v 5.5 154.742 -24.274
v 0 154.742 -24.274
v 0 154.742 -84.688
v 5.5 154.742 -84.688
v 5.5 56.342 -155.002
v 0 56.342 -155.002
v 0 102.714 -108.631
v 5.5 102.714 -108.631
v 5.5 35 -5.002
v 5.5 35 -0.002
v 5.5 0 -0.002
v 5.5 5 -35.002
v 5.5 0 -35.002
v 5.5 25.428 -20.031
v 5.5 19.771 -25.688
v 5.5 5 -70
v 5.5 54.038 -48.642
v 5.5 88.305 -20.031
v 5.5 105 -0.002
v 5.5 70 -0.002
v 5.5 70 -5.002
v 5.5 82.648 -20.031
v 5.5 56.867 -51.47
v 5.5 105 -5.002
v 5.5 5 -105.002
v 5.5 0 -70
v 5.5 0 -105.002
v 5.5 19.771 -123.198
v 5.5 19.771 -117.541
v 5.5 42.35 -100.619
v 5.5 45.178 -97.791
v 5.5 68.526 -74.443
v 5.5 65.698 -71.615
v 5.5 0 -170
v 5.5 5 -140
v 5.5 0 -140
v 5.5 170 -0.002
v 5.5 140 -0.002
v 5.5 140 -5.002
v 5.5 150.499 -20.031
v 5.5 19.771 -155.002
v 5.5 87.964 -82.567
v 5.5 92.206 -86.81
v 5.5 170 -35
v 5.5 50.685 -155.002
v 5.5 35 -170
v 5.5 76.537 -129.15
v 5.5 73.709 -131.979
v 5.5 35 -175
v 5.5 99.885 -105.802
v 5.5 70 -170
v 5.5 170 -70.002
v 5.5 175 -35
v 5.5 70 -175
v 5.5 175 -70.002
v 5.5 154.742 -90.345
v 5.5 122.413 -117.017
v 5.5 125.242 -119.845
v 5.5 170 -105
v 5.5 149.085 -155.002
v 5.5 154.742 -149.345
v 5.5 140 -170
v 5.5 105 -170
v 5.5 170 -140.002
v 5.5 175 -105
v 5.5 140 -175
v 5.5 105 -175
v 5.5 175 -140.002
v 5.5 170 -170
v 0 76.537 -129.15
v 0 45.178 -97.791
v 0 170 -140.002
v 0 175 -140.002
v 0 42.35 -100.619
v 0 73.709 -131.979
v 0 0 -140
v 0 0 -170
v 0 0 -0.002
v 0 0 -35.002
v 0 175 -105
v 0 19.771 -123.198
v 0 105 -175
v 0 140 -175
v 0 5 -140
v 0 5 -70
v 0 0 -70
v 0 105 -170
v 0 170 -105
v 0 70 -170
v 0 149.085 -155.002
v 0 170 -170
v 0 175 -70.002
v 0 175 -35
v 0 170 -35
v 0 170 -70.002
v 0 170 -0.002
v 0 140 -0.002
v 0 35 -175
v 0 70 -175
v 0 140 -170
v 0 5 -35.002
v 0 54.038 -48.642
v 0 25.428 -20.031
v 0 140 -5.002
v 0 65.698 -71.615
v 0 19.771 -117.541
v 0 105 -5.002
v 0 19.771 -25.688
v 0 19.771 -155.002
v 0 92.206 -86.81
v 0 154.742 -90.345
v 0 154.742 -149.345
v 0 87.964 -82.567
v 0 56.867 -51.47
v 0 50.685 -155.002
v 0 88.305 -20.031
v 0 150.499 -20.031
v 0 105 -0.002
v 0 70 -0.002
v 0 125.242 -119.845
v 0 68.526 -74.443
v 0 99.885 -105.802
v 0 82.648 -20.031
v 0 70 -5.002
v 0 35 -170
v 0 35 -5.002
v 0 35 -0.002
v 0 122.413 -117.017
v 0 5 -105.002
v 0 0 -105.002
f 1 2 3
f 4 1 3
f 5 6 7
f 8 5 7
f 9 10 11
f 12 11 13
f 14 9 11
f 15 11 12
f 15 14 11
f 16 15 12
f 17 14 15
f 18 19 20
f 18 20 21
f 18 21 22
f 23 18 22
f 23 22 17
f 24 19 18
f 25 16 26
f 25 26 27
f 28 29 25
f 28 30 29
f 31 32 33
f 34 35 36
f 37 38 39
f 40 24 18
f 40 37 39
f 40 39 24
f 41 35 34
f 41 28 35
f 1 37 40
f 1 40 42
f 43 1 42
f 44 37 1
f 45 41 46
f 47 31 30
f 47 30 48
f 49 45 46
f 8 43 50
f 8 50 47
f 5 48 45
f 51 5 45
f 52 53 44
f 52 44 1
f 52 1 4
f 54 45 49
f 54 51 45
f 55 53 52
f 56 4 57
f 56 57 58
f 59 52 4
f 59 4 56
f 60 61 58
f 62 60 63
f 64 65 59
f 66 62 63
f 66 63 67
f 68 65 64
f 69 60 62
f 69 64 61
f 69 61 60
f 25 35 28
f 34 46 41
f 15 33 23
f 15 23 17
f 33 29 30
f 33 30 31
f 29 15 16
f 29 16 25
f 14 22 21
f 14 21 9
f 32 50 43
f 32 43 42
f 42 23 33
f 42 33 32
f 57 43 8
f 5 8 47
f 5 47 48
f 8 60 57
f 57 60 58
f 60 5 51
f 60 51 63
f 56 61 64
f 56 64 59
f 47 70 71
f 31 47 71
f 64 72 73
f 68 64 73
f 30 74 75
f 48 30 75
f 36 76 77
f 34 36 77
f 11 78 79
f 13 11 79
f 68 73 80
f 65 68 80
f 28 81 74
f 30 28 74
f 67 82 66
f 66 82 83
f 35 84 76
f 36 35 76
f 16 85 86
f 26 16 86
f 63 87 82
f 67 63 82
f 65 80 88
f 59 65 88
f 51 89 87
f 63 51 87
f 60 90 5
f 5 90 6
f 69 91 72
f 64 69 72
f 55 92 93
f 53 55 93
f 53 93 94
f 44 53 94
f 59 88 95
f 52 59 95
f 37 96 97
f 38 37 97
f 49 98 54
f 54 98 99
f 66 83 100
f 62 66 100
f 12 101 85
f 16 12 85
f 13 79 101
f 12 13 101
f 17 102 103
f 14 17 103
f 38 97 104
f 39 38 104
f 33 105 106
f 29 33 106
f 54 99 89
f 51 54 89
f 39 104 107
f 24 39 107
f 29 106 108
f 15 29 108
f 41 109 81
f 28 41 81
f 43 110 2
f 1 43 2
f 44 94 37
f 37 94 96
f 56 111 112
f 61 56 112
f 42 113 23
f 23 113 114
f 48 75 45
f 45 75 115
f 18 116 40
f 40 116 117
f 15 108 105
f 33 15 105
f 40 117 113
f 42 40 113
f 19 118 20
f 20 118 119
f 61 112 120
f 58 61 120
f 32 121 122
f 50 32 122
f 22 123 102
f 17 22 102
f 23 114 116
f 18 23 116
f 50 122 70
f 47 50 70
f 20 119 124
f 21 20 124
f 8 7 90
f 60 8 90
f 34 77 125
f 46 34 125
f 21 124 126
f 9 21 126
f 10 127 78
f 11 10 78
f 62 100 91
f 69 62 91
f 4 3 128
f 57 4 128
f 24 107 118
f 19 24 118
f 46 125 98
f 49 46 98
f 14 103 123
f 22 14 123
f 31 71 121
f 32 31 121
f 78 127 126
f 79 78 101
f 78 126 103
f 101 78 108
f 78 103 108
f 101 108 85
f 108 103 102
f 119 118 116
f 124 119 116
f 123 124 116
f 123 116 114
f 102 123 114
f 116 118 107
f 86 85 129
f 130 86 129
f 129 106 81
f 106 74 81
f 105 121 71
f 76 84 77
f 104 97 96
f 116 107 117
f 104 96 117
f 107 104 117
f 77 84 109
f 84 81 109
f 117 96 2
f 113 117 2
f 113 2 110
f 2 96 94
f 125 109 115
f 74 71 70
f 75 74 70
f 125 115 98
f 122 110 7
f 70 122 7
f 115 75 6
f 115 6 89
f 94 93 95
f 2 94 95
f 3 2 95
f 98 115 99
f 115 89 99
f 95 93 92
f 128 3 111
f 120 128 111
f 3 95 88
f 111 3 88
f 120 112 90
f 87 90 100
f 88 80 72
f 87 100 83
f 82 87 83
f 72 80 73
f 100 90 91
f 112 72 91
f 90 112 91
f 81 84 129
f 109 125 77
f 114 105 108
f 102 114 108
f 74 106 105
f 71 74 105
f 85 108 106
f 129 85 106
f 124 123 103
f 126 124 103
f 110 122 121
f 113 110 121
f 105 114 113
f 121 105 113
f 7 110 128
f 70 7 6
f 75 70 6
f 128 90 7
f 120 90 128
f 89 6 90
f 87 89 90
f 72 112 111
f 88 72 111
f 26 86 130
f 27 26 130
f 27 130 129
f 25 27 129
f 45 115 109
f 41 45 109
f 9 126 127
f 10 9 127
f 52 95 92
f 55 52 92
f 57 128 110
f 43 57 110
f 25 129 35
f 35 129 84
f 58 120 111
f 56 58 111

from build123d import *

# Parameters (mm, degrees)
EXTRUDE_5_DEPTH = 5.5


with BuildPart() as part:
    # Эскиз1 → Бобышка-Вытянуть5 (new body)
    with BuildSketch(Plane(origin=(0, 0, 0), x_dir=(0, 0, -1), z_dir=(1, 0, 0))):
        Polygon((0.00204272, 35), (0.00204272, 0.000377999), (35.00204272, 0.000377999), (35.00204272, 5.000377999), (70, 5.000377999), (70, 0.000377999), (105.00204272, 0.000377999), (105.00204272, 5.000377999), (140, 5.000377999), (140, 0.000377999), (170, 0.000377999), (170, 35.000377999), (175, 35.000377999), (175, 70), (170, 70), (170, 105.000377999), (175, 105.000377999), (175, 140), (170, 140), (170, 170.000377999), (140.00204272, 170.000377999), (140.00204272, 175.000377999), (139.90204272, 175.000377999), (105, 175.000377999), (105, 170.000377999), (70.00204272, 170.000377999), (70.00204272, 175.000377999), (35, 175.000377999), (35, 170.000377999), (0.00204272, 170.000377999), (0.00204272, 140.000377999), (5.00204272, 140.000377999), (5.00204272, 105), (0.00204272, 105), (0.00204272, 70.000377999), (5.00204272, 70.000377999), (5.00204272, 35), align=None)
        Polygon((71.614687911, 65.697512044), (117.541103017, 19.771096938), (25.688272806, 19.771096938), align=None, mode=Mode.SUBTRACT)
        Polygon((20.031418556, 82.648268821), (48.641577373, 54.038110004), (20.031418556, 25.427951188), align=None, mode=Mode.SUBTRACT)
        Polygon((100.61937762, 42.349676584), (131.978534805, 73.708833769), (155.00204272, 50.685325854), (155.00204272, 19.771096938), (123.197957266, 19.771096938), align=None, mode=Mode.SUBTRACT)
        Polygon((105.802272221, 99.885096353), (129.15010768, 76.537260894), (97.790950495, 45.178103709), (74.443115036, 68.525939168), align=None, mode=Mode.SUBTRACT)
        Polygon((20.031418556, 150.499080414), (82.56698317, 87.963515801), (51.470004498, 56.866537129), (20.031418556, 88.30512307), align=None, mode=Mode.SUBTRACT)
        Polygon((84.688303513, 154.741721101), (117.016745992, 122.413278623), (86.809623857, 92.206156488), (24.274059243, 154.741721101), align=None, mode=Mode.SUBTRACT)
        Polygon((108.630699345, 102.713523478), (155.00204272, 149.084866852), (155.00204272, 56.342180104), align=None, mode=Mode.SUBTRACT)
        Polygon((149.34518847, 154.741721101), (119.845173116, 125.241705748), (90.345157763, 154.741721101), align=None, mode=Mode.SUBTRACT)
    extrude(amount=EXTRUDE_5_DEPTH)


solid = part.part
